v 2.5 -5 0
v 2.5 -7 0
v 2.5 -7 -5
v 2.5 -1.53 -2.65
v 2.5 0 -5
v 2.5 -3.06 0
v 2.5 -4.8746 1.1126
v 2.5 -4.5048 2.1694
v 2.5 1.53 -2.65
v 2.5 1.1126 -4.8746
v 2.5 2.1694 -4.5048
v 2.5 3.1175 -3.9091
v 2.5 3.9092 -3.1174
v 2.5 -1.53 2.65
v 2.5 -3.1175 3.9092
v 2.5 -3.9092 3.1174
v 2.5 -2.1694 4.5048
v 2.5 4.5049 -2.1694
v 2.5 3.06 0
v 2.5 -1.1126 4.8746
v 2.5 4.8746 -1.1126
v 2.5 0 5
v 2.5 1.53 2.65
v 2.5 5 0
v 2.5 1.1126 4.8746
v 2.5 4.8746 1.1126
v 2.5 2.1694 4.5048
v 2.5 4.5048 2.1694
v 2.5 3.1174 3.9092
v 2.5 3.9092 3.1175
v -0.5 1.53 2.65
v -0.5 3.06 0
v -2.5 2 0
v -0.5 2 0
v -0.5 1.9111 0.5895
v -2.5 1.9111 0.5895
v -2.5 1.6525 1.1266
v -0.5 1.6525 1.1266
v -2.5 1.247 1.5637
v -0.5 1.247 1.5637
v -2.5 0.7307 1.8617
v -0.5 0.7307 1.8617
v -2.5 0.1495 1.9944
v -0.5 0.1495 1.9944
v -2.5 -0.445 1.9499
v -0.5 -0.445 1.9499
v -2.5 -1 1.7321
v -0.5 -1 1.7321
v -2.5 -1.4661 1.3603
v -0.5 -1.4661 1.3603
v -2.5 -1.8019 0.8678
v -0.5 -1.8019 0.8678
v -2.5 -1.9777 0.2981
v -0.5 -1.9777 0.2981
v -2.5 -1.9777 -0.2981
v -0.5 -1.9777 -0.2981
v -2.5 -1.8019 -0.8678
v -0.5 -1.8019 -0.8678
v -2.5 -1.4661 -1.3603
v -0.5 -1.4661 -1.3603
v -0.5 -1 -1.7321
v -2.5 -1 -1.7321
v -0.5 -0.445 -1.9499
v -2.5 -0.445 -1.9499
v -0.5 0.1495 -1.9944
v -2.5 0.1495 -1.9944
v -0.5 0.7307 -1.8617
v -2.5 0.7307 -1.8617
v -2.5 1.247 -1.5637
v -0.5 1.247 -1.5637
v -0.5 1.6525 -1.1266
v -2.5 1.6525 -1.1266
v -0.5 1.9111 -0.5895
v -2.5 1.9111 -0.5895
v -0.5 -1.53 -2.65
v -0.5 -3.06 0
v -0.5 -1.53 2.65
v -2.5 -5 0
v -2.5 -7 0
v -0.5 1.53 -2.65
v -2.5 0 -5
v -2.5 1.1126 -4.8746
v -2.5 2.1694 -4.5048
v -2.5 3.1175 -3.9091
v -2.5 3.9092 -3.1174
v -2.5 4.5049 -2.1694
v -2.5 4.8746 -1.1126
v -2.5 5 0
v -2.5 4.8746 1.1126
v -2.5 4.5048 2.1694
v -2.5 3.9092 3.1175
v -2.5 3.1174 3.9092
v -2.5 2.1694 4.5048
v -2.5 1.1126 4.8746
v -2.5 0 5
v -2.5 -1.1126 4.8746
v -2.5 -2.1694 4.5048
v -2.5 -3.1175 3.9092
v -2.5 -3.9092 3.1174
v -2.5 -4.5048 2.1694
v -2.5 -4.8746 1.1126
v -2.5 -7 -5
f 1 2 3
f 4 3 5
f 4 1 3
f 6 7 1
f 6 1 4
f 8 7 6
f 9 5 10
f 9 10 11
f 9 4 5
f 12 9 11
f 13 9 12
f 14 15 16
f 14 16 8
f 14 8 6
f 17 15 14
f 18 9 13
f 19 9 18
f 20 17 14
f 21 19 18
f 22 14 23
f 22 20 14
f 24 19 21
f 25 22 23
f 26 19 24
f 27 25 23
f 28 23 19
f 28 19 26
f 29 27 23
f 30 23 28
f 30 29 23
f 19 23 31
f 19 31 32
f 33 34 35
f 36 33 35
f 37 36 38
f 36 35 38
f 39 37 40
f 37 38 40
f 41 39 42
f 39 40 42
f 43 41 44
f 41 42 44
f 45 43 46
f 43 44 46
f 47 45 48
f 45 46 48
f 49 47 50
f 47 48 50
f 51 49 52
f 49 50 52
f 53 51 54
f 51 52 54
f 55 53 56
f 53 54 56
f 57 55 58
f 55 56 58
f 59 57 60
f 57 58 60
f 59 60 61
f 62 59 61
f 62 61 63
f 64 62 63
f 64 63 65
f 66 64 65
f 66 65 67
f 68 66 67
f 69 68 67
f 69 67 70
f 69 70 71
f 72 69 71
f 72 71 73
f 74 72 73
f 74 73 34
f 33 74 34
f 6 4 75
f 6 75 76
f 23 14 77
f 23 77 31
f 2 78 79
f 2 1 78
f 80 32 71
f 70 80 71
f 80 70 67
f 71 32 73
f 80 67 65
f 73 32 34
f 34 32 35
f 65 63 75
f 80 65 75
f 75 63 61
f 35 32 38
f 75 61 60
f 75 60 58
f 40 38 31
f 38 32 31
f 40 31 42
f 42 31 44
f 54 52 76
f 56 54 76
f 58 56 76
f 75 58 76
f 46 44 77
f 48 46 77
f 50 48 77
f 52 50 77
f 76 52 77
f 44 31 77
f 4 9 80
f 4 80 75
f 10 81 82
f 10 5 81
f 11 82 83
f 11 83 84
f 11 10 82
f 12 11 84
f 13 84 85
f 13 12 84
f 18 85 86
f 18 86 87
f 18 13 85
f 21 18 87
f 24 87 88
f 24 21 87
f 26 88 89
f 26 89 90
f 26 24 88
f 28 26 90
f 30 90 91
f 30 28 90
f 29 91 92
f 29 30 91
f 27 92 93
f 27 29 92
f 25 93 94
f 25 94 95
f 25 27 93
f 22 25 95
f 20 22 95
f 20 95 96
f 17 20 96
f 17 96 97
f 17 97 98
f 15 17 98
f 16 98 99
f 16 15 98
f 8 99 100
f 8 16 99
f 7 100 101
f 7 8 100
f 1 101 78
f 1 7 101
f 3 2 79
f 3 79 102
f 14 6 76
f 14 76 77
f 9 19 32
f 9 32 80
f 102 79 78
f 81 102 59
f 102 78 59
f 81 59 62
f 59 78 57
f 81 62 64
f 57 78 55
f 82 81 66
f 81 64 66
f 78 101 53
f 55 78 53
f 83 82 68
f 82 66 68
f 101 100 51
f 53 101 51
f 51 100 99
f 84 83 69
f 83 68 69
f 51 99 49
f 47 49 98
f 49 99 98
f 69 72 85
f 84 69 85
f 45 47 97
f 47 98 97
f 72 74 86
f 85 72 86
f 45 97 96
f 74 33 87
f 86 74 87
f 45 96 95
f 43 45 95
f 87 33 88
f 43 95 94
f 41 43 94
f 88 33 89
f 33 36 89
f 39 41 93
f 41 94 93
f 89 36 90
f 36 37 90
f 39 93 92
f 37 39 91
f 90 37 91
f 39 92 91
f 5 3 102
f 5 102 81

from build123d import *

# Parameters (mm, degrees)
PAD001004_DEPTH    = 2.5
SKETCH006_R        = 2
POCKET003_DEPTH    = 5.001
POCKET003003_DEPTH = 3


with BuildPart() as part:
    # Sketch005 → Pad001004 (new body, symmetric)
    with BuildSketch(Plane.YZ):
        with BuildLine():
            Line((-5, 0), (-7, 0))
            Line((-7, 0), (-7, -5))
            Line((-7, -5), (1.8e-05, -5))
            ThreePointArc((1.8e-05, -5), (3.535528, 3.53554), (-5, 0))
        make_face()
    extrude(amount=PAD001004_DEPTH, both=True)

    # Sketch006 → Pocket003 (cut, through all)
    with BuildSketch(Plane.YZ.offset(2.5)):
        Circle(SKETCH006_R)
    extrude(amount=-POCKET003_DEPTH, mode=Mode.SUBTRACT)

    # Sketch007 → Pocket003003 (cut)
    with BuildSketch(Plane.YZ.offset(2.5)):
        Polygon((-3.059956, 0), (-1.529978, 2.65), (1.529978, 2.65), (3.059956, 0), (1.529978, -2.65), (-1.529978, -2.65), align=None)
    extrude(amount=-POCKET003003_DEPTH, mode=Mode.SUBTRACT)


solid = part.part
